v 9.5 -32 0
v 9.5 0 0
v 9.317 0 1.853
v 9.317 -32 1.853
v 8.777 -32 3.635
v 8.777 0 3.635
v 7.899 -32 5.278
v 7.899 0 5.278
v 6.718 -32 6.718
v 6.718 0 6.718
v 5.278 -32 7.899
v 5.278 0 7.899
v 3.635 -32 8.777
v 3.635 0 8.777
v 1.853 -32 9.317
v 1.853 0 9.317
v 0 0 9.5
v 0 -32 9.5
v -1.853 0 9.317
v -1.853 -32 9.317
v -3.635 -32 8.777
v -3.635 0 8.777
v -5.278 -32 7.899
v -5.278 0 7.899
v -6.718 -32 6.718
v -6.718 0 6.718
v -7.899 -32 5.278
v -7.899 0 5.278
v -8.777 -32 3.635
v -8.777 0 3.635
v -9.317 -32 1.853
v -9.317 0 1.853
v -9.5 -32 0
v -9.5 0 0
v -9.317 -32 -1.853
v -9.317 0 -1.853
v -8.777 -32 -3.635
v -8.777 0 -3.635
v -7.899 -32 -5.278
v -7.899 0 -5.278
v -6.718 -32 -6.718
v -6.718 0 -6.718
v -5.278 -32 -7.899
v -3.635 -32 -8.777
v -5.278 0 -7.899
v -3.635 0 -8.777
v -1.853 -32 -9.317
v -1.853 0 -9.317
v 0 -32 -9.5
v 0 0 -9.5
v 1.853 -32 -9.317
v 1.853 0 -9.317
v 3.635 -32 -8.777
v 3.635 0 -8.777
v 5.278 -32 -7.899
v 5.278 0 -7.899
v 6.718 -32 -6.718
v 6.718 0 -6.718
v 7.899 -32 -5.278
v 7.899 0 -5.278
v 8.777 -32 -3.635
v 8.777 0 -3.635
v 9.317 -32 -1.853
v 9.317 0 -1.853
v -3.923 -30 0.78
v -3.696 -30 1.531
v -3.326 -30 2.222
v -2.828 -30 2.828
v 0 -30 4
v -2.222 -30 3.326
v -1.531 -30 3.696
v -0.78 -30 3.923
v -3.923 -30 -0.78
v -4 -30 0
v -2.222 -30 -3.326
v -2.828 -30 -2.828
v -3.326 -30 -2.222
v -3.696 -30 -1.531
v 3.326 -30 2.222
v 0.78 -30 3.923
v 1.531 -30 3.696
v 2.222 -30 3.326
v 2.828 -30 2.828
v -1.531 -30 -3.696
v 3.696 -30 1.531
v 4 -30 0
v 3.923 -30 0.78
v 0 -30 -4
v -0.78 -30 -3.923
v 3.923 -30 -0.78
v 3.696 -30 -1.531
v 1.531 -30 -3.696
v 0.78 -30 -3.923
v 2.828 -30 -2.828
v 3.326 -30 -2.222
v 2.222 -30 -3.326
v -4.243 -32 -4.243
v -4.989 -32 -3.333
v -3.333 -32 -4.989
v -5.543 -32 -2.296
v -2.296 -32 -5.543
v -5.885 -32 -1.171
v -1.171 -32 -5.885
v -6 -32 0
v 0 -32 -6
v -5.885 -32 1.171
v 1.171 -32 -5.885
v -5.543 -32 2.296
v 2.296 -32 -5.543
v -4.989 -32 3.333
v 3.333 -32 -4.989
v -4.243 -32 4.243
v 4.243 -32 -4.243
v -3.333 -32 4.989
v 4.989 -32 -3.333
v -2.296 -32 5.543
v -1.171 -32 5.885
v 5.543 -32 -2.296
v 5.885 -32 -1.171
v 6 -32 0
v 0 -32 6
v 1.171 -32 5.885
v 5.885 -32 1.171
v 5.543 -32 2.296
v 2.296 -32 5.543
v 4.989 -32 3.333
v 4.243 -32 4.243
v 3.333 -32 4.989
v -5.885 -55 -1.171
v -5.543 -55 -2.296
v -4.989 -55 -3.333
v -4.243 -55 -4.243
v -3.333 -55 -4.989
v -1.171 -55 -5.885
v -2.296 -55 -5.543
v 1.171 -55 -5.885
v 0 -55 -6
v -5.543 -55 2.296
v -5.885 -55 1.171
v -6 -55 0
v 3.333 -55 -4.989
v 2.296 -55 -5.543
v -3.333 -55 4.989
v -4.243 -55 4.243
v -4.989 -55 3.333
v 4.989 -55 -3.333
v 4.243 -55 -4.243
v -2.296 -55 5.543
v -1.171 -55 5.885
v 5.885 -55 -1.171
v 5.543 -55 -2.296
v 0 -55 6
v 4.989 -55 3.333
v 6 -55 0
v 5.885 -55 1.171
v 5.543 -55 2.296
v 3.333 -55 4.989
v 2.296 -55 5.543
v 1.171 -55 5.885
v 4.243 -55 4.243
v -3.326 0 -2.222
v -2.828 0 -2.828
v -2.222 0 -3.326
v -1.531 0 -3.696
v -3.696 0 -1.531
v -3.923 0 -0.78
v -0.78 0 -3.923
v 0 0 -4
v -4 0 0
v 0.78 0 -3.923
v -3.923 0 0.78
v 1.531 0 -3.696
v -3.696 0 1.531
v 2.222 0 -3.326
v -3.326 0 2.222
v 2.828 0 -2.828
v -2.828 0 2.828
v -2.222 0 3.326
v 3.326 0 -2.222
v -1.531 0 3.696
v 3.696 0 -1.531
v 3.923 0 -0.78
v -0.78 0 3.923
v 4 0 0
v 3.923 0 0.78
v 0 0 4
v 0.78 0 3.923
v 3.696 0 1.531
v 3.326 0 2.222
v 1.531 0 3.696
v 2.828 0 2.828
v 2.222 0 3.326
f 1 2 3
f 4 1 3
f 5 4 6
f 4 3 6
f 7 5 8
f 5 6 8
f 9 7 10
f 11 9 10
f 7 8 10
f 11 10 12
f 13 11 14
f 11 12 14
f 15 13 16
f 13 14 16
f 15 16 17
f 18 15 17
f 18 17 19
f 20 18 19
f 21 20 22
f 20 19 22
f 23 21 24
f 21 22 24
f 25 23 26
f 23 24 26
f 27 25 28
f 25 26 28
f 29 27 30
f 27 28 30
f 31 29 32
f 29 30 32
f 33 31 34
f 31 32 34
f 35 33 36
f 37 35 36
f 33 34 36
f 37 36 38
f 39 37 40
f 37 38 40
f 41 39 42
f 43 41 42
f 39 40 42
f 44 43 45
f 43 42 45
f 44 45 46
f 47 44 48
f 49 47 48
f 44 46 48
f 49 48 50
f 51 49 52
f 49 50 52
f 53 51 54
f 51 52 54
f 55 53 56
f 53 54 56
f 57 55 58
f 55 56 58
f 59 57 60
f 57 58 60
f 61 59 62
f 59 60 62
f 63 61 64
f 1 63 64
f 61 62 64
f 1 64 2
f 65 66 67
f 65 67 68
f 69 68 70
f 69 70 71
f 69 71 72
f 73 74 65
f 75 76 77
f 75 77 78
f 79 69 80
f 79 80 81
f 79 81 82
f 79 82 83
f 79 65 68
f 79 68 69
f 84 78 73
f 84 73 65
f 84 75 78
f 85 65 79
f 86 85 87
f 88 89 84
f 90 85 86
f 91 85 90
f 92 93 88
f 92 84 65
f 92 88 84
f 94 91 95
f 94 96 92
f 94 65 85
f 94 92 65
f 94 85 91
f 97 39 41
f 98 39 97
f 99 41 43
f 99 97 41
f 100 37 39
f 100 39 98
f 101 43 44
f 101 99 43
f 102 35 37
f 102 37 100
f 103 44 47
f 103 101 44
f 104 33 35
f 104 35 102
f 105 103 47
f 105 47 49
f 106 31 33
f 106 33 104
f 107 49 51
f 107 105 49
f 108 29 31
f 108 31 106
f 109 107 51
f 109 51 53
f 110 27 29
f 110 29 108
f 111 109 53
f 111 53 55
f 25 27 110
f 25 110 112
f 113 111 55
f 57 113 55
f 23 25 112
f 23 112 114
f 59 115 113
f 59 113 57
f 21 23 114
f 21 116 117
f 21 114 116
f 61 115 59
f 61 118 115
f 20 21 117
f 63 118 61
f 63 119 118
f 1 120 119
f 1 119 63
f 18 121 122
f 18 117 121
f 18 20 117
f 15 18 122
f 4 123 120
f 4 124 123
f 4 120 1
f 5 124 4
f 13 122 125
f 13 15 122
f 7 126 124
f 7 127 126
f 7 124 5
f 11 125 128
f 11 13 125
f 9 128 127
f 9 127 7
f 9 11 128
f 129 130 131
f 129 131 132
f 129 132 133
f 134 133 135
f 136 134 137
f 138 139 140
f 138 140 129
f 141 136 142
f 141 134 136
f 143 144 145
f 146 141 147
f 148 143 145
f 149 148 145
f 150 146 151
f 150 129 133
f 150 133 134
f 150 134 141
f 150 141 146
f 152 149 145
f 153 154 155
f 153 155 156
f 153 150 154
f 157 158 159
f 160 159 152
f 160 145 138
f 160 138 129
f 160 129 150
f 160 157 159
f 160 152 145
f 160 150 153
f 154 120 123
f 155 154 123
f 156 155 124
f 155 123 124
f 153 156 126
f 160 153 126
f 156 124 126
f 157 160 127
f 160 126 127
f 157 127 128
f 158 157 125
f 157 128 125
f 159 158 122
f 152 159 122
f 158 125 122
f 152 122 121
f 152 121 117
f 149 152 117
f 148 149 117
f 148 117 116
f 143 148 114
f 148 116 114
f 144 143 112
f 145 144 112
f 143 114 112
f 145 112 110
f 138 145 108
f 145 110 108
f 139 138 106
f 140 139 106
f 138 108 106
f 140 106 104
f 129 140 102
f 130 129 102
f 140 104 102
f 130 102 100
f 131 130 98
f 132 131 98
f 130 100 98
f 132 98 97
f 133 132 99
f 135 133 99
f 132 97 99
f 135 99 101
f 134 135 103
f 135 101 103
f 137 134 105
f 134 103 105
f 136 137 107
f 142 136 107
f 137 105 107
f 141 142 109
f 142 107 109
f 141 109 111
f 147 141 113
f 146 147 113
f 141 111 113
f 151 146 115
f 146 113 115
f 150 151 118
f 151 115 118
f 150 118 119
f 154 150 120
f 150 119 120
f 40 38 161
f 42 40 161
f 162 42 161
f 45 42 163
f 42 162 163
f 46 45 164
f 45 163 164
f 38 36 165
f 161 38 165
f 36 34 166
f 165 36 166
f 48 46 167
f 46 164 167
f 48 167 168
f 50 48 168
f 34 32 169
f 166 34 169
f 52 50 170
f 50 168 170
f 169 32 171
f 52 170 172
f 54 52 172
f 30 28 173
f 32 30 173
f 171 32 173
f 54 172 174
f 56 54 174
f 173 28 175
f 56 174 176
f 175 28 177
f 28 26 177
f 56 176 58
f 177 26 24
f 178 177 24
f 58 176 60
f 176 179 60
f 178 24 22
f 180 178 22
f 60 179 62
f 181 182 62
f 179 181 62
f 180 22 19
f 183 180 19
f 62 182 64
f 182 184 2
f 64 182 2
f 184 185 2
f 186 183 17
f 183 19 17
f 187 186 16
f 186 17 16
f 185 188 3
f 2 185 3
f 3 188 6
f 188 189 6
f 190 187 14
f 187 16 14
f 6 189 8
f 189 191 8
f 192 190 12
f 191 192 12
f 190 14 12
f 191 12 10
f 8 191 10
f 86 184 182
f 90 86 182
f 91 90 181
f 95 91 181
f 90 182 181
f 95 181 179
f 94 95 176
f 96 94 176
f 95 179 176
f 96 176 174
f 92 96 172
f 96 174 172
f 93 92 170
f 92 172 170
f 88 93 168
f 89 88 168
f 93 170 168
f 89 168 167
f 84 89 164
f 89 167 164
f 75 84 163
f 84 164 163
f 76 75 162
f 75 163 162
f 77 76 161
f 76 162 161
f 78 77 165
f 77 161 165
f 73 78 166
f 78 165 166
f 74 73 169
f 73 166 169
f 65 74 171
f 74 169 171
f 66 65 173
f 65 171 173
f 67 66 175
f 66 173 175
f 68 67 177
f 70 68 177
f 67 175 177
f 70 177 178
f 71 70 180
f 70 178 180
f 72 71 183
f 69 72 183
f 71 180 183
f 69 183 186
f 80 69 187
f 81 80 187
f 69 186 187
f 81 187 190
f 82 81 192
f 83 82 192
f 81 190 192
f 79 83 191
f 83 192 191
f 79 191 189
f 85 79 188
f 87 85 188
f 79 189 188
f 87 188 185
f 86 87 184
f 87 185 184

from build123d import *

# Parameters (mm, degrees)
SKETCH013_R     = 9.5
PAD011_DEPTH    = 32
SKETCH014_R     = 4
POCKET002_DEPTH = 30
SKETCH015_R     = 6
PAD012_DEPTH    = 23


with BuildPart() as part:
    # Sketch013 → Pad011 (new body)
    with BuildSketch(Plane.XZ):
        Circle(SKETCH013_R)
    extrude(amount=PAD011_DEPTH)

    # Sketch014 (on Face2 of Pad011) → Pocket002 (cut)
    with BuildSketch(Plane(origin=(0, 0, 0), x_dir=(1, 0, 0), z_dir=(0, 1, 0))):
        Circle(SKETCH014_R)
    extrude(amount=-POCKET002_DEPTH, mode=Mode.SUBTRACT)

    # Sketch015 (on Face3 of Pocket002) → Pad012 (new body)
    with BuildSketch(Plane.XZ.offset(32)):
        Circle(SKETCH015_R)
    extrude(amount=PAD012_DEPTH)


solid = part.part
